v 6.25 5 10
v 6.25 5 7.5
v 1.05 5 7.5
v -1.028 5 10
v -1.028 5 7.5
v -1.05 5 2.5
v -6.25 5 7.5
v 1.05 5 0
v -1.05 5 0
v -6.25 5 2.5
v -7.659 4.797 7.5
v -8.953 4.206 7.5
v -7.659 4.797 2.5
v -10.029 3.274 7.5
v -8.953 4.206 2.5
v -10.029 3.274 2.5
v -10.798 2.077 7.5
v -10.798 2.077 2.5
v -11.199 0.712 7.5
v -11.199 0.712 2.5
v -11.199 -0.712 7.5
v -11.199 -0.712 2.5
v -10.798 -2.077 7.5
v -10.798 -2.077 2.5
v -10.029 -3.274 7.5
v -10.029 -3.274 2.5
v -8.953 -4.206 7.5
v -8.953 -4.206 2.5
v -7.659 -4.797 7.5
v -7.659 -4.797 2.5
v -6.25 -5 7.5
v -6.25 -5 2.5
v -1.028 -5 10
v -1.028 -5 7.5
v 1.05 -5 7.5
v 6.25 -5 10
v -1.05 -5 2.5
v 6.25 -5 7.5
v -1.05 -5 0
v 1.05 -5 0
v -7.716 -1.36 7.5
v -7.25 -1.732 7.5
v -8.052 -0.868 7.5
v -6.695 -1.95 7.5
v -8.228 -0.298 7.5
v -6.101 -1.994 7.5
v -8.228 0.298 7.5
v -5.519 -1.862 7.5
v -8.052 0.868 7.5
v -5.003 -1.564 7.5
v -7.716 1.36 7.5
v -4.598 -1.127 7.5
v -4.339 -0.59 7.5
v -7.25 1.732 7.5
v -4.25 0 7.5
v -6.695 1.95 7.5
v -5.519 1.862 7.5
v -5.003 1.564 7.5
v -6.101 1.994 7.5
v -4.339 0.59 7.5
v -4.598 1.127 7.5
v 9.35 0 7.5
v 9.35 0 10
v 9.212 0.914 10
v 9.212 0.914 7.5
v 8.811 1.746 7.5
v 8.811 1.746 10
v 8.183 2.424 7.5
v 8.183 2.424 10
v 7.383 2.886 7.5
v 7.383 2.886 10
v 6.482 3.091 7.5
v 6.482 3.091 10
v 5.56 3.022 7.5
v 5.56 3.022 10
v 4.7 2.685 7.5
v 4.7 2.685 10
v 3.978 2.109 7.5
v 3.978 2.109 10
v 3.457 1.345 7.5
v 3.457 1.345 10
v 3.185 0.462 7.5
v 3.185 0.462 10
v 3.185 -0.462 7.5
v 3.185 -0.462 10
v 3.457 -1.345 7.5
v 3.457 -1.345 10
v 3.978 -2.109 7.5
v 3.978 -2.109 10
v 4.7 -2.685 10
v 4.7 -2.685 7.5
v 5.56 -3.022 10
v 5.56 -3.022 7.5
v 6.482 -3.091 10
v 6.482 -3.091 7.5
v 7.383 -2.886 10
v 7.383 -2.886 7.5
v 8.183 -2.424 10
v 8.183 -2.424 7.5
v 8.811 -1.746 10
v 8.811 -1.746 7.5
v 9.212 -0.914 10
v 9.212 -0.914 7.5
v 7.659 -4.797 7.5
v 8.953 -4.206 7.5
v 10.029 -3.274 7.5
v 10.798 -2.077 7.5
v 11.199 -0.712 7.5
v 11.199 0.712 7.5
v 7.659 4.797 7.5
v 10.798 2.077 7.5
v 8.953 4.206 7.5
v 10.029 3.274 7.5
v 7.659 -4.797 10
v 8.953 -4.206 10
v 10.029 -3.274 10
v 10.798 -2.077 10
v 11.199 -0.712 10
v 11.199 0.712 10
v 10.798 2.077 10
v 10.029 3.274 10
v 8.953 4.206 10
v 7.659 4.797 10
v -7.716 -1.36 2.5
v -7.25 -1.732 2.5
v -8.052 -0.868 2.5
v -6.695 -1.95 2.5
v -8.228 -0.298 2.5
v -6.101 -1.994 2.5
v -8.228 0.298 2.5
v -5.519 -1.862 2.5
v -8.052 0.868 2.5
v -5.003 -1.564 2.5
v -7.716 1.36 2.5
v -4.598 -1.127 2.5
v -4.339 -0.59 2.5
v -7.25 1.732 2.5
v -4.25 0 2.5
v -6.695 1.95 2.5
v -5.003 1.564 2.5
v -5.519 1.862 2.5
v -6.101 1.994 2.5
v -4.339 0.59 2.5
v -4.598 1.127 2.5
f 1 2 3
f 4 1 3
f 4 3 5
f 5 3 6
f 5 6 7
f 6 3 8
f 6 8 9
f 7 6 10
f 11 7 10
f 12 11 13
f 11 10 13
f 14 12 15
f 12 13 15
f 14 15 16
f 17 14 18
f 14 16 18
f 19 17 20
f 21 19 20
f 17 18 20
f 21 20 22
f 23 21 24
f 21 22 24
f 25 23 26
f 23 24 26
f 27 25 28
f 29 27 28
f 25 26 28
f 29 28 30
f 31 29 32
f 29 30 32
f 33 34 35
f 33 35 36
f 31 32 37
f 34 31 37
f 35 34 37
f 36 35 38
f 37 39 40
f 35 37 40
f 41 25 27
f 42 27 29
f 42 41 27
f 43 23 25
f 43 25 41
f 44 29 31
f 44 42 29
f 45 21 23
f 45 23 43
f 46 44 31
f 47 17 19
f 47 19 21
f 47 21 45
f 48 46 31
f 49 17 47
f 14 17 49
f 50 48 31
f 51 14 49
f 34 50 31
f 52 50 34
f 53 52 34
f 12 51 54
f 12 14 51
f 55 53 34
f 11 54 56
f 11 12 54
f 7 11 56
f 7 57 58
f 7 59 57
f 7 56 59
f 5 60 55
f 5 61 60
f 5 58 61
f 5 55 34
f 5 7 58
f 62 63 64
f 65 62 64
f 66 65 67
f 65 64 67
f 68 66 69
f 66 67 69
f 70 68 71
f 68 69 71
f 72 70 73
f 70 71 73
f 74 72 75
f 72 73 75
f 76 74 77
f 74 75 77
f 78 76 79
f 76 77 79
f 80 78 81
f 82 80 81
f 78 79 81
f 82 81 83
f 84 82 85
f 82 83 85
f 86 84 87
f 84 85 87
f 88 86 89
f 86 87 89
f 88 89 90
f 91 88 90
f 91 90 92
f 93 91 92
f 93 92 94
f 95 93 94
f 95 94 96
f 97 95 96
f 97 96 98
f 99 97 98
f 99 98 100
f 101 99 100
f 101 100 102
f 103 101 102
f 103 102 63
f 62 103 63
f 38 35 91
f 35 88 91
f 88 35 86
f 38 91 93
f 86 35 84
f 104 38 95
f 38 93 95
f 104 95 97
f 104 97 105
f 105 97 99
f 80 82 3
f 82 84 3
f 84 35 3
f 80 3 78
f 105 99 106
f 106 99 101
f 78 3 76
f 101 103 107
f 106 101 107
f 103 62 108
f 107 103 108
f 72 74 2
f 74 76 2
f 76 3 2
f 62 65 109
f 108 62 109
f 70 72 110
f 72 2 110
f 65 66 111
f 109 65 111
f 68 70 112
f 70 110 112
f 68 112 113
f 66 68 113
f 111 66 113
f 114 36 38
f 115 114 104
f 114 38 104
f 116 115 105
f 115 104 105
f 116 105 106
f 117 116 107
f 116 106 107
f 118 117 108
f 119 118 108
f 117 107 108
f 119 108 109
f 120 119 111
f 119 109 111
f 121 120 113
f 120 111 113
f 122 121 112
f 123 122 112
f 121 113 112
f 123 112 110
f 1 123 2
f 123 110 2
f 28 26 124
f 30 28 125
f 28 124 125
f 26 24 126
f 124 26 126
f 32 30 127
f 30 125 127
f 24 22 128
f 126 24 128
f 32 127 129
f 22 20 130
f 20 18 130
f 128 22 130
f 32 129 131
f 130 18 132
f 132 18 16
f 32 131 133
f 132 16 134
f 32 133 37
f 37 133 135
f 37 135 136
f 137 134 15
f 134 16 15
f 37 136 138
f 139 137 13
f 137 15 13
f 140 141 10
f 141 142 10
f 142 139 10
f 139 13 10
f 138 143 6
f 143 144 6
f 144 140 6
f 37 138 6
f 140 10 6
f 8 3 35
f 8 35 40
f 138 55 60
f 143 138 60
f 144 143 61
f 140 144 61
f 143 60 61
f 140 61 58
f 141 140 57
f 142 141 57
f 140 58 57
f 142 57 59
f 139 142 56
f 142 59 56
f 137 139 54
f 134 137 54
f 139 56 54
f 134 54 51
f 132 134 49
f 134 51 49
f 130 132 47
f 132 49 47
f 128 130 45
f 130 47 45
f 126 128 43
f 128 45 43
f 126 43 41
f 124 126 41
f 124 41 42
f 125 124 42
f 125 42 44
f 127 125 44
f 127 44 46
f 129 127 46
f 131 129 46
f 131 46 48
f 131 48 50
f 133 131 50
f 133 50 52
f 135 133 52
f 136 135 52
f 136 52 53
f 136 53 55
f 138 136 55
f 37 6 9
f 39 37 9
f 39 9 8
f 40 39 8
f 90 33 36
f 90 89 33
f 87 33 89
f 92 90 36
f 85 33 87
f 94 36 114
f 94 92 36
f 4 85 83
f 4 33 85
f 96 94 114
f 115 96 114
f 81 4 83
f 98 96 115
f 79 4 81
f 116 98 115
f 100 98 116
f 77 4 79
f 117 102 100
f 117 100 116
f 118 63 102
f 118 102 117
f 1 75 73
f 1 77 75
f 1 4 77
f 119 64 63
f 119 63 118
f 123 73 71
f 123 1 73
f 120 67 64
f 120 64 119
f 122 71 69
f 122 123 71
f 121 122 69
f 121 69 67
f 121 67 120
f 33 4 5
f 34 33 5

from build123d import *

# Parameters (mm, degrees)
EXTRUDE_1_DEPTH     = 10
SKETCH_3_W          = 5
SKETCH_3_H          = 2.5
CUT_EXTRUDE_2_DEPTH = 19.071040369
SKETCH_4_W          = 10.2
SKETCH_4_H          = 2.5
SKETCH_4_W_2        = 10.22157303
SKETCH_4_H_2        = 7.5
CUT_EXTRUDE_3_DEPTH = 19.071040369
EXTRUDE_START       = -1.5
SKETCH_2_R          = 2
EXTRUDE_2_DEPTH     = 3
SKETCH_2_3_R        = 2
SKETCH_2_3_R_2      = 3.1
CUT_EXTRUDE_4_DEPTH = 16.860721926


with BuildPart() as part:
    # 草圖1 → 填料-伸長1 (new body)
    with BuildSketch(Plane.XY):
        with BuildLine():
            Line((-6.25, -5), (6.25, -5))
            ThreePointArc((6.25, -5), (11.25, 0), (6.25, 5))
            Line((6.25, 5), (-6.25, 5))
            ThreePointArc((-6.25, 5), (-11.25, 0), (-6.25, -5))
        make_face()
    extrude(amount=EXTRUDE_1_DEPTH)

    # 草圖3 → 除料-伸長2 (cut, through all)
    with BuildSketch(Plane(origin=(0, 5, 0), x_dir=(1, 0, 0), z_dir=(0, 1, 0))):
        with Locations((8.75, -5)):
            Rectangle(SKETCH_3_W, SKETCH_3_H)
    extrude(amount=-CUT_EXTRUDE_2_DEPTH, mode=Mode.SUBTRACT)

    # 草圖4 → 除料-伸長3 (cut, through all)
    with BuildSketch(Plane(origin=(0, 5, 0), x_dir=(1, 0, 0), z_dir=(0, 1, 0))):
        with Locations((-6.15, -1.25)):
            Rectangle(SKETCH_4_W, SKETCH_4_H)
        with Locations((-6.139213485, -8.75)):
            Rectangle(SKETCH_4_W_2, SKETCH_4_H)
        with Locations((6.15, -3.75)):
            Rectangle(SKETCH_4_W, SKETCH_4_H_2)
    extrude(amount=-CUT_EXTRUDE_3_DEPTH, mode=Mode.SUBTRACT)

    # 草圖2 → 填料-伸長2 (add)
    with BuildSketch(Plane.XY.offset(10).offset(EXTRUDE_START)):
        with Locations((-6.25, 0)):
            Circle(SKETCH_2_R)
    extrude(amount=-EXTRUDE_2_DEPTH)

    # 草圖2<3> → 除料-伸長4 (cut, through all)
    with BuildSketch(Plane.XY.offset(10)):
        with Locations((-6.25, 0)):
            Circle(SKETCH_2_3_R)
        with Locations((6.25, 0)):
            Circle(SKETCH_2_3_R_2)
    extrude(amount=-CUT_EXTRUDE_4_DEPTH, mode=Mode.SUBTRACT)


solid = part.part
